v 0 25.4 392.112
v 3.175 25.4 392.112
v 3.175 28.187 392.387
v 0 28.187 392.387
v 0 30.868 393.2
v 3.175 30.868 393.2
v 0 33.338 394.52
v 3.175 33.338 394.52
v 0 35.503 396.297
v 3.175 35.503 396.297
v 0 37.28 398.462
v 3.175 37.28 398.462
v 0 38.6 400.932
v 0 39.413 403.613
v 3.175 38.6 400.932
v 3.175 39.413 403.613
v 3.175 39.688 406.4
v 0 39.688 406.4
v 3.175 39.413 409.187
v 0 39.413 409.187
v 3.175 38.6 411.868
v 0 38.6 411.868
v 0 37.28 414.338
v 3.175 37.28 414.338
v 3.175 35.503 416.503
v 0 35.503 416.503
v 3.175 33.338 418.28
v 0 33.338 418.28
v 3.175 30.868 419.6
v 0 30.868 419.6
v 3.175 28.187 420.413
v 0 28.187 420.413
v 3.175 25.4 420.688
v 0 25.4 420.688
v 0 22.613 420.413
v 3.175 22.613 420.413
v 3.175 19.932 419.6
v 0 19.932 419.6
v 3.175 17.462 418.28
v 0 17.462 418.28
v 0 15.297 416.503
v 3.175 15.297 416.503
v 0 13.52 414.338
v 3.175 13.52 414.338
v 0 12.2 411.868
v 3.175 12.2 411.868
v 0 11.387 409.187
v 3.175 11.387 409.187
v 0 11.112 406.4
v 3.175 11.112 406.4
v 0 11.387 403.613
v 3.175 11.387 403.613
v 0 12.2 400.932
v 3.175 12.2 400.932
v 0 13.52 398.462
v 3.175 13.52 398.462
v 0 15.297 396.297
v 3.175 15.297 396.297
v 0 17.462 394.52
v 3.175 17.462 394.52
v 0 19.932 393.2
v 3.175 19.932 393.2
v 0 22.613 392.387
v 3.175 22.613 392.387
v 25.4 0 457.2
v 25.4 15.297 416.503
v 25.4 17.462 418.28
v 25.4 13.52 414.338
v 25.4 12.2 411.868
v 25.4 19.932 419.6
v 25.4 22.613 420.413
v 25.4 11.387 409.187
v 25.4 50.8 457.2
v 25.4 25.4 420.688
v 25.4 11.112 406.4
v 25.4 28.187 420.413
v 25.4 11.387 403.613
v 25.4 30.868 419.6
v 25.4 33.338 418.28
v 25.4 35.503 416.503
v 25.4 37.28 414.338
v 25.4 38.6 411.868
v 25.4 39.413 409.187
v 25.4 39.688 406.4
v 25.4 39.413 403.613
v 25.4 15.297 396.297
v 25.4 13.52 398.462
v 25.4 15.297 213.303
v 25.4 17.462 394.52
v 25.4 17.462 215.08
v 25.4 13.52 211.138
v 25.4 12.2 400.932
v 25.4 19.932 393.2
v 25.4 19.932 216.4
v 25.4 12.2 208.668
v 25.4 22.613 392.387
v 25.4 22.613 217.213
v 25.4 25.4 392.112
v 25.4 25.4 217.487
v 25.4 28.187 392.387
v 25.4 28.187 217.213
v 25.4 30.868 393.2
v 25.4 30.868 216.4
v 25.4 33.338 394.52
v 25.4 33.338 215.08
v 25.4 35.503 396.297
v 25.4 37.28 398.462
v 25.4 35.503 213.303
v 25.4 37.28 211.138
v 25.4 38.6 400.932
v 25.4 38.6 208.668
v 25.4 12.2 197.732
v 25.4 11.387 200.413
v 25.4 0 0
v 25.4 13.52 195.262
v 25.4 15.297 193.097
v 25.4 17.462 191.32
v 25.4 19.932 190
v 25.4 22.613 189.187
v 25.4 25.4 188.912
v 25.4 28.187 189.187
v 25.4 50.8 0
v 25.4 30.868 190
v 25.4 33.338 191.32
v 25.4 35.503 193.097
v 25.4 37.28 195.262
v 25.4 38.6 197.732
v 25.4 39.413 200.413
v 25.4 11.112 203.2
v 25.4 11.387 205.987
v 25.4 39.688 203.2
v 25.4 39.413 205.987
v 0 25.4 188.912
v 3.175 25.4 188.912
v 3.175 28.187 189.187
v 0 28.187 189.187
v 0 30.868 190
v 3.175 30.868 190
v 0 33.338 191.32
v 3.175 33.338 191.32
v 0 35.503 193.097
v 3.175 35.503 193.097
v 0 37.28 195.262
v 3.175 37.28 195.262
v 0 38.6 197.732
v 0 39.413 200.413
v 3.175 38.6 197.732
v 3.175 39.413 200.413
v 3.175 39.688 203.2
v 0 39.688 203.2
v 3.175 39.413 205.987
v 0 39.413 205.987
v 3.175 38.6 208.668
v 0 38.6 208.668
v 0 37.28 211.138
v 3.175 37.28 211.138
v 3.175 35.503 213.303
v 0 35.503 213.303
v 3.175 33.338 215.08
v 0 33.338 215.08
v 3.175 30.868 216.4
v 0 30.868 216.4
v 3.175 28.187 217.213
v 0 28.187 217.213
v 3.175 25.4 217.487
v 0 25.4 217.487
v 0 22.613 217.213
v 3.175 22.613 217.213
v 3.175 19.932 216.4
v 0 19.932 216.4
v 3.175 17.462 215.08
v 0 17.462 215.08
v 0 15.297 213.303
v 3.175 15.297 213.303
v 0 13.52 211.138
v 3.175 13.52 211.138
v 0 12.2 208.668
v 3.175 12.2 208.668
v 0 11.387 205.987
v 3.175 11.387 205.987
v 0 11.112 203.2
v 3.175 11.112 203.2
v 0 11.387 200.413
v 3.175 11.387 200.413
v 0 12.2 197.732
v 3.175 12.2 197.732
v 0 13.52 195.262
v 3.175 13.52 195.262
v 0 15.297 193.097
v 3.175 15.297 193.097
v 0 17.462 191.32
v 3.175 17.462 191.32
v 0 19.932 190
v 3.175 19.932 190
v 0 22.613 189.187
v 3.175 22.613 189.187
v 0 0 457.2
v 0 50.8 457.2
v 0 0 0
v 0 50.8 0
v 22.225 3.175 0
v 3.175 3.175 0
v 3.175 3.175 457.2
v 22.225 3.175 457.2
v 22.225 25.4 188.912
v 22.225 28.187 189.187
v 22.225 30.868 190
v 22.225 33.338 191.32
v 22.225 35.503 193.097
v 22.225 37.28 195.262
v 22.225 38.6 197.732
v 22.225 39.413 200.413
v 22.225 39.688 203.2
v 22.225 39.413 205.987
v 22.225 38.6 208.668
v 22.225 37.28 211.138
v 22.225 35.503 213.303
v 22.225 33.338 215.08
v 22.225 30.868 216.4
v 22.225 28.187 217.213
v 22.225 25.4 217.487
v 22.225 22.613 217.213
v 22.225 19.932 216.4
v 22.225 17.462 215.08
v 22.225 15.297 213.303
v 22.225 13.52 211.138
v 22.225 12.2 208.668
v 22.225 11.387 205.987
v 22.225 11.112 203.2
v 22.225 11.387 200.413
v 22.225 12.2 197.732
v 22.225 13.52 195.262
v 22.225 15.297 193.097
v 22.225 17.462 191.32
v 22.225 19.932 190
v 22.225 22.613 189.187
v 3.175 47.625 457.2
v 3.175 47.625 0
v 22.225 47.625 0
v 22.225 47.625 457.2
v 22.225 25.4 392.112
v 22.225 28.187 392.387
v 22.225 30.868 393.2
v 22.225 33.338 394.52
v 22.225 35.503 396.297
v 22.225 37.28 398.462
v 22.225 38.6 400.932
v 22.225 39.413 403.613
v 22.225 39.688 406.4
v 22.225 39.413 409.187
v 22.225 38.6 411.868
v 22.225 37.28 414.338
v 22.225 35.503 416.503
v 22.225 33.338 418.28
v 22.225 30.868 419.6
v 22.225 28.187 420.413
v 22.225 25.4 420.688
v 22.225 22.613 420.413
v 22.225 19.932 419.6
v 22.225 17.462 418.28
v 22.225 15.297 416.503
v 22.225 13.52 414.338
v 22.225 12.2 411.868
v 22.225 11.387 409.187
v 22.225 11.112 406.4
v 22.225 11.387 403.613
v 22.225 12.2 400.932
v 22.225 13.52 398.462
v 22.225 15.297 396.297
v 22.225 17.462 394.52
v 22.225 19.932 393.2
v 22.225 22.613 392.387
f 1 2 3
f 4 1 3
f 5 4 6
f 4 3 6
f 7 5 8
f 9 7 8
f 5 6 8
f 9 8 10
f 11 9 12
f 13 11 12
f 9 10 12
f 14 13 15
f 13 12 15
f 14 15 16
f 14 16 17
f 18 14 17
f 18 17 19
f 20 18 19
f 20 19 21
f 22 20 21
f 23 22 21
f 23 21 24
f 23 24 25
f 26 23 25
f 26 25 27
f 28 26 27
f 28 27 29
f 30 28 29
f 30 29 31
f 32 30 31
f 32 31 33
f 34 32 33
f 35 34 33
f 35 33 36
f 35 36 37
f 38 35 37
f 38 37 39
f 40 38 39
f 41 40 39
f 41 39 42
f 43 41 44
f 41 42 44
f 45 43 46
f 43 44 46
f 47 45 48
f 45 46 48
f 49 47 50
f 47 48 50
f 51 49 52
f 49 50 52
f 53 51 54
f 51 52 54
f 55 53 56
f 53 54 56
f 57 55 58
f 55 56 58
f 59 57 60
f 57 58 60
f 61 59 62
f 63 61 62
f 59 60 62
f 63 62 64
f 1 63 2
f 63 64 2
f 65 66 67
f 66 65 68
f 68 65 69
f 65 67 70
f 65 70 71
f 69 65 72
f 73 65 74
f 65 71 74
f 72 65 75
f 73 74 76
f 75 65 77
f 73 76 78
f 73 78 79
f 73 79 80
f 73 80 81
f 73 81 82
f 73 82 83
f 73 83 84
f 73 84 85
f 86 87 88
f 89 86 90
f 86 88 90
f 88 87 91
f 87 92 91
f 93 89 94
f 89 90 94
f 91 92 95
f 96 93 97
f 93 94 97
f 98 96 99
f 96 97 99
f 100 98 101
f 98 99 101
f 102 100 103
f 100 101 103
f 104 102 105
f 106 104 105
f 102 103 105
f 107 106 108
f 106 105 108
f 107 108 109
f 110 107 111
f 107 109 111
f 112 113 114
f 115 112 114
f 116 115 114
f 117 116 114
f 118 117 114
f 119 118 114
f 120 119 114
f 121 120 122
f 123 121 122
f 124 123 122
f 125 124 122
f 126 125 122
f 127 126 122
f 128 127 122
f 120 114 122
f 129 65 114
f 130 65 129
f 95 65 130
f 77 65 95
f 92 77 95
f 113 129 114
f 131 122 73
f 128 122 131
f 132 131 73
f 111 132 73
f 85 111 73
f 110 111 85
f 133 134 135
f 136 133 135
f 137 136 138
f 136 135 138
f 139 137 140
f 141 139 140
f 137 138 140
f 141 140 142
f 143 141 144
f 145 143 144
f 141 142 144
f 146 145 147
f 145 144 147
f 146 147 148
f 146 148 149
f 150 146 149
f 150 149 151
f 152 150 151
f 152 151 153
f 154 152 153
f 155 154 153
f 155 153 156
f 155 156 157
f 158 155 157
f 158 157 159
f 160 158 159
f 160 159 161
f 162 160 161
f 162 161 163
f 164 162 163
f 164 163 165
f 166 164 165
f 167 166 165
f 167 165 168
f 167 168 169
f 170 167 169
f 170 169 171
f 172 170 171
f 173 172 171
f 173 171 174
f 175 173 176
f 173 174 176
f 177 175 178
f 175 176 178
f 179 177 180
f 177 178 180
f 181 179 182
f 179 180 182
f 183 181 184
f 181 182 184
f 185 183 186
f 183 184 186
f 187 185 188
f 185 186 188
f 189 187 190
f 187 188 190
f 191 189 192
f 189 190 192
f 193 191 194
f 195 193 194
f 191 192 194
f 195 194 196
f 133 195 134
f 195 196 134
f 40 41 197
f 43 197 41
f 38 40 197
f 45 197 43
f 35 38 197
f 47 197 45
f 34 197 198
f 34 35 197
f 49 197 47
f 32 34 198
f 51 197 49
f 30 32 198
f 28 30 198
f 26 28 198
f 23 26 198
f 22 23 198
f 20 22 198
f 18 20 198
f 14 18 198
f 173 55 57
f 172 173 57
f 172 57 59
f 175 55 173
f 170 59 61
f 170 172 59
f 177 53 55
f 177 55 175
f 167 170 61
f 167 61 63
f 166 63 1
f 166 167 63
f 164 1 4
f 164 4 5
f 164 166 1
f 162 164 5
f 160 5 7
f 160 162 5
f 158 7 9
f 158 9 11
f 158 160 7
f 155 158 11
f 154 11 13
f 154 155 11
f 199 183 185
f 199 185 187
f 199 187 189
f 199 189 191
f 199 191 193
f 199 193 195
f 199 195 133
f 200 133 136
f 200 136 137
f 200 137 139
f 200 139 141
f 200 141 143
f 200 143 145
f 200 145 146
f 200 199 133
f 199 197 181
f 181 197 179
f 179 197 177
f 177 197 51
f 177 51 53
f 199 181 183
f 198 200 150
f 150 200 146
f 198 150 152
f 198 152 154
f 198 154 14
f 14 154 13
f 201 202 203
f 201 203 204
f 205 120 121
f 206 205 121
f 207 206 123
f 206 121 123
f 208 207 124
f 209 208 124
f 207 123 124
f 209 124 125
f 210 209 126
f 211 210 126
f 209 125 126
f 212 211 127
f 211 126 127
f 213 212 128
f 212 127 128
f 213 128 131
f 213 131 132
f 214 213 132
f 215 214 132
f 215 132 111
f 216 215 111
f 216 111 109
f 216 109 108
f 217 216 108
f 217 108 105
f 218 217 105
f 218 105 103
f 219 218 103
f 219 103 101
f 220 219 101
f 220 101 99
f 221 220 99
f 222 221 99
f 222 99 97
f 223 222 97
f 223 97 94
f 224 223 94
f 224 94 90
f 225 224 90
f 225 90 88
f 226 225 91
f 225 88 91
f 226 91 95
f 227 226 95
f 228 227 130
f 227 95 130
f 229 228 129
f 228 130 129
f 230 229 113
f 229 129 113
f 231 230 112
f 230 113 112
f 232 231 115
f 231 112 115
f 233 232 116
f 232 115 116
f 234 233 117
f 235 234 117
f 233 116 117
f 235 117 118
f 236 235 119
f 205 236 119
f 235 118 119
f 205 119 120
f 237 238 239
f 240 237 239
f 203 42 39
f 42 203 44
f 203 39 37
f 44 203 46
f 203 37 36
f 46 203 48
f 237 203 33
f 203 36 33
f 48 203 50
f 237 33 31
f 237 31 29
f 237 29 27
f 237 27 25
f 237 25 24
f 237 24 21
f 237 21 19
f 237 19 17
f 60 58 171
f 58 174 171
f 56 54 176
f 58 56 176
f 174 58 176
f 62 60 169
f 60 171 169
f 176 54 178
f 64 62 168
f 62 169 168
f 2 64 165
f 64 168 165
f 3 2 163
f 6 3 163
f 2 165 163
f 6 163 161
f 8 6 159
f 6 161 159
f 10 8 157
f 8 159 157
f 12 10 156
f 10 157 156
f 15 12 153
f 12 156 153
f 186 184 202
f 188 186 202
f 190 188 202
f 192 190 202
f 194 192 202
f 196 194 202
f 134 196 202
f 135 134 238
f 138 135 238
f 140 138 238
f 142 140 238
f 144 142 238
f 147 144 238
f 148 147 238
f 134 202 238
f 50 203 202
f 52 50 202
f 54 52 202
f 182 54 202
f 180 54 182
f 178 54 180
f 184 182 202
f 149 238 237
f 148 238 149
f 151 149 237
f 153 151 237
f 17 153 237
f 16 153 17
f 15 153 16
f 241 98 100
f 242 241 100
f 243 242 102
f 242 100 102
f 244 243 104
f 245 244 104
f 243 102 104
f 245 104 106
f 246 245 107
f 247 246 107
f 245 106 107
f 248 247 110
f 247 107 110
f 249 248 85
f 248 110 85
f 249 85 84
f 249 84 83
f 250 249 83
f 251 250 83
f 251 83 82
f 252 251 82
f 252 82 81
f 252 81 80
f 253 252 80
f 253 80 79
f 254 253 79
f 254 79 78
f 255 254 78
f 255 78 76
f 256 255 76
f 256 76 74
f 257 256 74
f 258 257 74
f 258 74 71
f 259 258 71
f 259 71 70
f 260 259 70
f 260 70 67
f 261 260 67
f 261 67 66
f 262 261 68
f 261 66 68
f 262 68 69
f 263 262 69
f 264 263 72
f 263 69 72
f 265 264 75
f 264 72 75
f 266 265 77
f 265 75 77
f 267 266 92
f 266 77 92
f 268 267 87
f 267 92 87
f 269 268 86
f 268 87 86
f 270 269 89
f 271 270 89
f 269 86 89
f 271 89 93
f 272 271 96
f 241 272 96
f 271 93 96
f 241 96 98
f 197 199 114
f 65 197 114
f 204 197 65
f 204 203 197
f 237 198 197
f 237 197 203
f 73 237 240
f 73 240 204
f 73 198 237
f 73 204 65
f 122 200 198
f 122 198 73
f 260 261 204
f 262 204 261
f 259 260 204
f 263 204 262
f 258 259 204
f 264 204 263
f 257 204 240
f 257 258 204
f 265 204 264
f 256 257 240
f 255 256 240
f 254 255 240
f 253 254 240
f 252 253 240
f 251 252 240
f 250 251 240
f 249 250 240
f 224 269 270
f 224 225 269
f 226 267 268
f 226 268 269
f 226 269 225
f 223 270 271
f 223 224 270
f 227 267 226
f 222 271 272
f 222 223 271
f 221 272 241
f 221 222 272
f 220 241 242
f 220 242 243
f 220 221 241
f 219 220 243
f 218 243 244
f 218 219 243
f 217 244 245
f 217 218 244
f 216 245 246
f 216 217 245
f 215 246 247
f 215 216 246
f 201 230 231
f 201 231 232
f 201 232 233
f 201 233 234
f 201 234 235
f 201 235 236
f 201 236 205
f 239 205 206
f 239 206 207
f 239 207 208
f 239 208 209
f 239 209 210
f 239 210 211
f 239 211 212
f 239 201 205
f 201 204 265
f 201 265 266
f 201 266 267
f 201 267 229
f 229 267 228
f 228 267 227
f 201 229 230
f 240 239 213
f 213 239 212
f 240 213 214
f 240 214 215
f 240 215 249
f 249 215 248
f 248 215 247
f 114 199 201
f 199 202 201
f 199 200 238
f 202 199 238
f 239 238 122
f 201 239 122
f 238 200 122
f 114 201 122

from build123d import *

# Parameters (mm, degrees)
SKETCH1_W           = 25.4
SKETCH1_H           = 50.8
SKETCH1_W_2         = 19.05
SKETCH1_H_2         = 44.45
BOSS_EXTRUDE1_DEPTH = 457.2
SKETCH2_R           = 14.2875
CUT_EXTRUDE1_DEPTH  = 26.4


with BuildPart() as part:
    # Sketch1 → Boss-Extrude1 (new body)
    with BuildSketch(Plane.XY):
        with Locations((12.7, 25.4)):
            Rectangle(SKETCH1_W, SKETCH1_H)
        with Locations((12.7, 25.4)):
            Rectangle(SKETCH1_W_2, SKETCH1_H_2, mode=Mode.SUBTRACT)
    extrude(amount=BOSS_EXTRUDE1_DEPTH)

    # Sketch2 → Cut-Extrude1 (cut, through all)
    with BuildSketch(Plane(origin=(25.4, 0, 0), x_dir=(0, 0, -1), z_dir=(1, 0, 0))):
        with Locations((-406.4, 25.4)):
            Circle(SKETCH2_R)
        with Locations((-203.2, 25.4)):
            Circle(SKETCH2_R)
    extrude(amount=-CUT_EXTRUDE1_DEPTH, mode=Mode.SUBTRACT)


solid = part.part
